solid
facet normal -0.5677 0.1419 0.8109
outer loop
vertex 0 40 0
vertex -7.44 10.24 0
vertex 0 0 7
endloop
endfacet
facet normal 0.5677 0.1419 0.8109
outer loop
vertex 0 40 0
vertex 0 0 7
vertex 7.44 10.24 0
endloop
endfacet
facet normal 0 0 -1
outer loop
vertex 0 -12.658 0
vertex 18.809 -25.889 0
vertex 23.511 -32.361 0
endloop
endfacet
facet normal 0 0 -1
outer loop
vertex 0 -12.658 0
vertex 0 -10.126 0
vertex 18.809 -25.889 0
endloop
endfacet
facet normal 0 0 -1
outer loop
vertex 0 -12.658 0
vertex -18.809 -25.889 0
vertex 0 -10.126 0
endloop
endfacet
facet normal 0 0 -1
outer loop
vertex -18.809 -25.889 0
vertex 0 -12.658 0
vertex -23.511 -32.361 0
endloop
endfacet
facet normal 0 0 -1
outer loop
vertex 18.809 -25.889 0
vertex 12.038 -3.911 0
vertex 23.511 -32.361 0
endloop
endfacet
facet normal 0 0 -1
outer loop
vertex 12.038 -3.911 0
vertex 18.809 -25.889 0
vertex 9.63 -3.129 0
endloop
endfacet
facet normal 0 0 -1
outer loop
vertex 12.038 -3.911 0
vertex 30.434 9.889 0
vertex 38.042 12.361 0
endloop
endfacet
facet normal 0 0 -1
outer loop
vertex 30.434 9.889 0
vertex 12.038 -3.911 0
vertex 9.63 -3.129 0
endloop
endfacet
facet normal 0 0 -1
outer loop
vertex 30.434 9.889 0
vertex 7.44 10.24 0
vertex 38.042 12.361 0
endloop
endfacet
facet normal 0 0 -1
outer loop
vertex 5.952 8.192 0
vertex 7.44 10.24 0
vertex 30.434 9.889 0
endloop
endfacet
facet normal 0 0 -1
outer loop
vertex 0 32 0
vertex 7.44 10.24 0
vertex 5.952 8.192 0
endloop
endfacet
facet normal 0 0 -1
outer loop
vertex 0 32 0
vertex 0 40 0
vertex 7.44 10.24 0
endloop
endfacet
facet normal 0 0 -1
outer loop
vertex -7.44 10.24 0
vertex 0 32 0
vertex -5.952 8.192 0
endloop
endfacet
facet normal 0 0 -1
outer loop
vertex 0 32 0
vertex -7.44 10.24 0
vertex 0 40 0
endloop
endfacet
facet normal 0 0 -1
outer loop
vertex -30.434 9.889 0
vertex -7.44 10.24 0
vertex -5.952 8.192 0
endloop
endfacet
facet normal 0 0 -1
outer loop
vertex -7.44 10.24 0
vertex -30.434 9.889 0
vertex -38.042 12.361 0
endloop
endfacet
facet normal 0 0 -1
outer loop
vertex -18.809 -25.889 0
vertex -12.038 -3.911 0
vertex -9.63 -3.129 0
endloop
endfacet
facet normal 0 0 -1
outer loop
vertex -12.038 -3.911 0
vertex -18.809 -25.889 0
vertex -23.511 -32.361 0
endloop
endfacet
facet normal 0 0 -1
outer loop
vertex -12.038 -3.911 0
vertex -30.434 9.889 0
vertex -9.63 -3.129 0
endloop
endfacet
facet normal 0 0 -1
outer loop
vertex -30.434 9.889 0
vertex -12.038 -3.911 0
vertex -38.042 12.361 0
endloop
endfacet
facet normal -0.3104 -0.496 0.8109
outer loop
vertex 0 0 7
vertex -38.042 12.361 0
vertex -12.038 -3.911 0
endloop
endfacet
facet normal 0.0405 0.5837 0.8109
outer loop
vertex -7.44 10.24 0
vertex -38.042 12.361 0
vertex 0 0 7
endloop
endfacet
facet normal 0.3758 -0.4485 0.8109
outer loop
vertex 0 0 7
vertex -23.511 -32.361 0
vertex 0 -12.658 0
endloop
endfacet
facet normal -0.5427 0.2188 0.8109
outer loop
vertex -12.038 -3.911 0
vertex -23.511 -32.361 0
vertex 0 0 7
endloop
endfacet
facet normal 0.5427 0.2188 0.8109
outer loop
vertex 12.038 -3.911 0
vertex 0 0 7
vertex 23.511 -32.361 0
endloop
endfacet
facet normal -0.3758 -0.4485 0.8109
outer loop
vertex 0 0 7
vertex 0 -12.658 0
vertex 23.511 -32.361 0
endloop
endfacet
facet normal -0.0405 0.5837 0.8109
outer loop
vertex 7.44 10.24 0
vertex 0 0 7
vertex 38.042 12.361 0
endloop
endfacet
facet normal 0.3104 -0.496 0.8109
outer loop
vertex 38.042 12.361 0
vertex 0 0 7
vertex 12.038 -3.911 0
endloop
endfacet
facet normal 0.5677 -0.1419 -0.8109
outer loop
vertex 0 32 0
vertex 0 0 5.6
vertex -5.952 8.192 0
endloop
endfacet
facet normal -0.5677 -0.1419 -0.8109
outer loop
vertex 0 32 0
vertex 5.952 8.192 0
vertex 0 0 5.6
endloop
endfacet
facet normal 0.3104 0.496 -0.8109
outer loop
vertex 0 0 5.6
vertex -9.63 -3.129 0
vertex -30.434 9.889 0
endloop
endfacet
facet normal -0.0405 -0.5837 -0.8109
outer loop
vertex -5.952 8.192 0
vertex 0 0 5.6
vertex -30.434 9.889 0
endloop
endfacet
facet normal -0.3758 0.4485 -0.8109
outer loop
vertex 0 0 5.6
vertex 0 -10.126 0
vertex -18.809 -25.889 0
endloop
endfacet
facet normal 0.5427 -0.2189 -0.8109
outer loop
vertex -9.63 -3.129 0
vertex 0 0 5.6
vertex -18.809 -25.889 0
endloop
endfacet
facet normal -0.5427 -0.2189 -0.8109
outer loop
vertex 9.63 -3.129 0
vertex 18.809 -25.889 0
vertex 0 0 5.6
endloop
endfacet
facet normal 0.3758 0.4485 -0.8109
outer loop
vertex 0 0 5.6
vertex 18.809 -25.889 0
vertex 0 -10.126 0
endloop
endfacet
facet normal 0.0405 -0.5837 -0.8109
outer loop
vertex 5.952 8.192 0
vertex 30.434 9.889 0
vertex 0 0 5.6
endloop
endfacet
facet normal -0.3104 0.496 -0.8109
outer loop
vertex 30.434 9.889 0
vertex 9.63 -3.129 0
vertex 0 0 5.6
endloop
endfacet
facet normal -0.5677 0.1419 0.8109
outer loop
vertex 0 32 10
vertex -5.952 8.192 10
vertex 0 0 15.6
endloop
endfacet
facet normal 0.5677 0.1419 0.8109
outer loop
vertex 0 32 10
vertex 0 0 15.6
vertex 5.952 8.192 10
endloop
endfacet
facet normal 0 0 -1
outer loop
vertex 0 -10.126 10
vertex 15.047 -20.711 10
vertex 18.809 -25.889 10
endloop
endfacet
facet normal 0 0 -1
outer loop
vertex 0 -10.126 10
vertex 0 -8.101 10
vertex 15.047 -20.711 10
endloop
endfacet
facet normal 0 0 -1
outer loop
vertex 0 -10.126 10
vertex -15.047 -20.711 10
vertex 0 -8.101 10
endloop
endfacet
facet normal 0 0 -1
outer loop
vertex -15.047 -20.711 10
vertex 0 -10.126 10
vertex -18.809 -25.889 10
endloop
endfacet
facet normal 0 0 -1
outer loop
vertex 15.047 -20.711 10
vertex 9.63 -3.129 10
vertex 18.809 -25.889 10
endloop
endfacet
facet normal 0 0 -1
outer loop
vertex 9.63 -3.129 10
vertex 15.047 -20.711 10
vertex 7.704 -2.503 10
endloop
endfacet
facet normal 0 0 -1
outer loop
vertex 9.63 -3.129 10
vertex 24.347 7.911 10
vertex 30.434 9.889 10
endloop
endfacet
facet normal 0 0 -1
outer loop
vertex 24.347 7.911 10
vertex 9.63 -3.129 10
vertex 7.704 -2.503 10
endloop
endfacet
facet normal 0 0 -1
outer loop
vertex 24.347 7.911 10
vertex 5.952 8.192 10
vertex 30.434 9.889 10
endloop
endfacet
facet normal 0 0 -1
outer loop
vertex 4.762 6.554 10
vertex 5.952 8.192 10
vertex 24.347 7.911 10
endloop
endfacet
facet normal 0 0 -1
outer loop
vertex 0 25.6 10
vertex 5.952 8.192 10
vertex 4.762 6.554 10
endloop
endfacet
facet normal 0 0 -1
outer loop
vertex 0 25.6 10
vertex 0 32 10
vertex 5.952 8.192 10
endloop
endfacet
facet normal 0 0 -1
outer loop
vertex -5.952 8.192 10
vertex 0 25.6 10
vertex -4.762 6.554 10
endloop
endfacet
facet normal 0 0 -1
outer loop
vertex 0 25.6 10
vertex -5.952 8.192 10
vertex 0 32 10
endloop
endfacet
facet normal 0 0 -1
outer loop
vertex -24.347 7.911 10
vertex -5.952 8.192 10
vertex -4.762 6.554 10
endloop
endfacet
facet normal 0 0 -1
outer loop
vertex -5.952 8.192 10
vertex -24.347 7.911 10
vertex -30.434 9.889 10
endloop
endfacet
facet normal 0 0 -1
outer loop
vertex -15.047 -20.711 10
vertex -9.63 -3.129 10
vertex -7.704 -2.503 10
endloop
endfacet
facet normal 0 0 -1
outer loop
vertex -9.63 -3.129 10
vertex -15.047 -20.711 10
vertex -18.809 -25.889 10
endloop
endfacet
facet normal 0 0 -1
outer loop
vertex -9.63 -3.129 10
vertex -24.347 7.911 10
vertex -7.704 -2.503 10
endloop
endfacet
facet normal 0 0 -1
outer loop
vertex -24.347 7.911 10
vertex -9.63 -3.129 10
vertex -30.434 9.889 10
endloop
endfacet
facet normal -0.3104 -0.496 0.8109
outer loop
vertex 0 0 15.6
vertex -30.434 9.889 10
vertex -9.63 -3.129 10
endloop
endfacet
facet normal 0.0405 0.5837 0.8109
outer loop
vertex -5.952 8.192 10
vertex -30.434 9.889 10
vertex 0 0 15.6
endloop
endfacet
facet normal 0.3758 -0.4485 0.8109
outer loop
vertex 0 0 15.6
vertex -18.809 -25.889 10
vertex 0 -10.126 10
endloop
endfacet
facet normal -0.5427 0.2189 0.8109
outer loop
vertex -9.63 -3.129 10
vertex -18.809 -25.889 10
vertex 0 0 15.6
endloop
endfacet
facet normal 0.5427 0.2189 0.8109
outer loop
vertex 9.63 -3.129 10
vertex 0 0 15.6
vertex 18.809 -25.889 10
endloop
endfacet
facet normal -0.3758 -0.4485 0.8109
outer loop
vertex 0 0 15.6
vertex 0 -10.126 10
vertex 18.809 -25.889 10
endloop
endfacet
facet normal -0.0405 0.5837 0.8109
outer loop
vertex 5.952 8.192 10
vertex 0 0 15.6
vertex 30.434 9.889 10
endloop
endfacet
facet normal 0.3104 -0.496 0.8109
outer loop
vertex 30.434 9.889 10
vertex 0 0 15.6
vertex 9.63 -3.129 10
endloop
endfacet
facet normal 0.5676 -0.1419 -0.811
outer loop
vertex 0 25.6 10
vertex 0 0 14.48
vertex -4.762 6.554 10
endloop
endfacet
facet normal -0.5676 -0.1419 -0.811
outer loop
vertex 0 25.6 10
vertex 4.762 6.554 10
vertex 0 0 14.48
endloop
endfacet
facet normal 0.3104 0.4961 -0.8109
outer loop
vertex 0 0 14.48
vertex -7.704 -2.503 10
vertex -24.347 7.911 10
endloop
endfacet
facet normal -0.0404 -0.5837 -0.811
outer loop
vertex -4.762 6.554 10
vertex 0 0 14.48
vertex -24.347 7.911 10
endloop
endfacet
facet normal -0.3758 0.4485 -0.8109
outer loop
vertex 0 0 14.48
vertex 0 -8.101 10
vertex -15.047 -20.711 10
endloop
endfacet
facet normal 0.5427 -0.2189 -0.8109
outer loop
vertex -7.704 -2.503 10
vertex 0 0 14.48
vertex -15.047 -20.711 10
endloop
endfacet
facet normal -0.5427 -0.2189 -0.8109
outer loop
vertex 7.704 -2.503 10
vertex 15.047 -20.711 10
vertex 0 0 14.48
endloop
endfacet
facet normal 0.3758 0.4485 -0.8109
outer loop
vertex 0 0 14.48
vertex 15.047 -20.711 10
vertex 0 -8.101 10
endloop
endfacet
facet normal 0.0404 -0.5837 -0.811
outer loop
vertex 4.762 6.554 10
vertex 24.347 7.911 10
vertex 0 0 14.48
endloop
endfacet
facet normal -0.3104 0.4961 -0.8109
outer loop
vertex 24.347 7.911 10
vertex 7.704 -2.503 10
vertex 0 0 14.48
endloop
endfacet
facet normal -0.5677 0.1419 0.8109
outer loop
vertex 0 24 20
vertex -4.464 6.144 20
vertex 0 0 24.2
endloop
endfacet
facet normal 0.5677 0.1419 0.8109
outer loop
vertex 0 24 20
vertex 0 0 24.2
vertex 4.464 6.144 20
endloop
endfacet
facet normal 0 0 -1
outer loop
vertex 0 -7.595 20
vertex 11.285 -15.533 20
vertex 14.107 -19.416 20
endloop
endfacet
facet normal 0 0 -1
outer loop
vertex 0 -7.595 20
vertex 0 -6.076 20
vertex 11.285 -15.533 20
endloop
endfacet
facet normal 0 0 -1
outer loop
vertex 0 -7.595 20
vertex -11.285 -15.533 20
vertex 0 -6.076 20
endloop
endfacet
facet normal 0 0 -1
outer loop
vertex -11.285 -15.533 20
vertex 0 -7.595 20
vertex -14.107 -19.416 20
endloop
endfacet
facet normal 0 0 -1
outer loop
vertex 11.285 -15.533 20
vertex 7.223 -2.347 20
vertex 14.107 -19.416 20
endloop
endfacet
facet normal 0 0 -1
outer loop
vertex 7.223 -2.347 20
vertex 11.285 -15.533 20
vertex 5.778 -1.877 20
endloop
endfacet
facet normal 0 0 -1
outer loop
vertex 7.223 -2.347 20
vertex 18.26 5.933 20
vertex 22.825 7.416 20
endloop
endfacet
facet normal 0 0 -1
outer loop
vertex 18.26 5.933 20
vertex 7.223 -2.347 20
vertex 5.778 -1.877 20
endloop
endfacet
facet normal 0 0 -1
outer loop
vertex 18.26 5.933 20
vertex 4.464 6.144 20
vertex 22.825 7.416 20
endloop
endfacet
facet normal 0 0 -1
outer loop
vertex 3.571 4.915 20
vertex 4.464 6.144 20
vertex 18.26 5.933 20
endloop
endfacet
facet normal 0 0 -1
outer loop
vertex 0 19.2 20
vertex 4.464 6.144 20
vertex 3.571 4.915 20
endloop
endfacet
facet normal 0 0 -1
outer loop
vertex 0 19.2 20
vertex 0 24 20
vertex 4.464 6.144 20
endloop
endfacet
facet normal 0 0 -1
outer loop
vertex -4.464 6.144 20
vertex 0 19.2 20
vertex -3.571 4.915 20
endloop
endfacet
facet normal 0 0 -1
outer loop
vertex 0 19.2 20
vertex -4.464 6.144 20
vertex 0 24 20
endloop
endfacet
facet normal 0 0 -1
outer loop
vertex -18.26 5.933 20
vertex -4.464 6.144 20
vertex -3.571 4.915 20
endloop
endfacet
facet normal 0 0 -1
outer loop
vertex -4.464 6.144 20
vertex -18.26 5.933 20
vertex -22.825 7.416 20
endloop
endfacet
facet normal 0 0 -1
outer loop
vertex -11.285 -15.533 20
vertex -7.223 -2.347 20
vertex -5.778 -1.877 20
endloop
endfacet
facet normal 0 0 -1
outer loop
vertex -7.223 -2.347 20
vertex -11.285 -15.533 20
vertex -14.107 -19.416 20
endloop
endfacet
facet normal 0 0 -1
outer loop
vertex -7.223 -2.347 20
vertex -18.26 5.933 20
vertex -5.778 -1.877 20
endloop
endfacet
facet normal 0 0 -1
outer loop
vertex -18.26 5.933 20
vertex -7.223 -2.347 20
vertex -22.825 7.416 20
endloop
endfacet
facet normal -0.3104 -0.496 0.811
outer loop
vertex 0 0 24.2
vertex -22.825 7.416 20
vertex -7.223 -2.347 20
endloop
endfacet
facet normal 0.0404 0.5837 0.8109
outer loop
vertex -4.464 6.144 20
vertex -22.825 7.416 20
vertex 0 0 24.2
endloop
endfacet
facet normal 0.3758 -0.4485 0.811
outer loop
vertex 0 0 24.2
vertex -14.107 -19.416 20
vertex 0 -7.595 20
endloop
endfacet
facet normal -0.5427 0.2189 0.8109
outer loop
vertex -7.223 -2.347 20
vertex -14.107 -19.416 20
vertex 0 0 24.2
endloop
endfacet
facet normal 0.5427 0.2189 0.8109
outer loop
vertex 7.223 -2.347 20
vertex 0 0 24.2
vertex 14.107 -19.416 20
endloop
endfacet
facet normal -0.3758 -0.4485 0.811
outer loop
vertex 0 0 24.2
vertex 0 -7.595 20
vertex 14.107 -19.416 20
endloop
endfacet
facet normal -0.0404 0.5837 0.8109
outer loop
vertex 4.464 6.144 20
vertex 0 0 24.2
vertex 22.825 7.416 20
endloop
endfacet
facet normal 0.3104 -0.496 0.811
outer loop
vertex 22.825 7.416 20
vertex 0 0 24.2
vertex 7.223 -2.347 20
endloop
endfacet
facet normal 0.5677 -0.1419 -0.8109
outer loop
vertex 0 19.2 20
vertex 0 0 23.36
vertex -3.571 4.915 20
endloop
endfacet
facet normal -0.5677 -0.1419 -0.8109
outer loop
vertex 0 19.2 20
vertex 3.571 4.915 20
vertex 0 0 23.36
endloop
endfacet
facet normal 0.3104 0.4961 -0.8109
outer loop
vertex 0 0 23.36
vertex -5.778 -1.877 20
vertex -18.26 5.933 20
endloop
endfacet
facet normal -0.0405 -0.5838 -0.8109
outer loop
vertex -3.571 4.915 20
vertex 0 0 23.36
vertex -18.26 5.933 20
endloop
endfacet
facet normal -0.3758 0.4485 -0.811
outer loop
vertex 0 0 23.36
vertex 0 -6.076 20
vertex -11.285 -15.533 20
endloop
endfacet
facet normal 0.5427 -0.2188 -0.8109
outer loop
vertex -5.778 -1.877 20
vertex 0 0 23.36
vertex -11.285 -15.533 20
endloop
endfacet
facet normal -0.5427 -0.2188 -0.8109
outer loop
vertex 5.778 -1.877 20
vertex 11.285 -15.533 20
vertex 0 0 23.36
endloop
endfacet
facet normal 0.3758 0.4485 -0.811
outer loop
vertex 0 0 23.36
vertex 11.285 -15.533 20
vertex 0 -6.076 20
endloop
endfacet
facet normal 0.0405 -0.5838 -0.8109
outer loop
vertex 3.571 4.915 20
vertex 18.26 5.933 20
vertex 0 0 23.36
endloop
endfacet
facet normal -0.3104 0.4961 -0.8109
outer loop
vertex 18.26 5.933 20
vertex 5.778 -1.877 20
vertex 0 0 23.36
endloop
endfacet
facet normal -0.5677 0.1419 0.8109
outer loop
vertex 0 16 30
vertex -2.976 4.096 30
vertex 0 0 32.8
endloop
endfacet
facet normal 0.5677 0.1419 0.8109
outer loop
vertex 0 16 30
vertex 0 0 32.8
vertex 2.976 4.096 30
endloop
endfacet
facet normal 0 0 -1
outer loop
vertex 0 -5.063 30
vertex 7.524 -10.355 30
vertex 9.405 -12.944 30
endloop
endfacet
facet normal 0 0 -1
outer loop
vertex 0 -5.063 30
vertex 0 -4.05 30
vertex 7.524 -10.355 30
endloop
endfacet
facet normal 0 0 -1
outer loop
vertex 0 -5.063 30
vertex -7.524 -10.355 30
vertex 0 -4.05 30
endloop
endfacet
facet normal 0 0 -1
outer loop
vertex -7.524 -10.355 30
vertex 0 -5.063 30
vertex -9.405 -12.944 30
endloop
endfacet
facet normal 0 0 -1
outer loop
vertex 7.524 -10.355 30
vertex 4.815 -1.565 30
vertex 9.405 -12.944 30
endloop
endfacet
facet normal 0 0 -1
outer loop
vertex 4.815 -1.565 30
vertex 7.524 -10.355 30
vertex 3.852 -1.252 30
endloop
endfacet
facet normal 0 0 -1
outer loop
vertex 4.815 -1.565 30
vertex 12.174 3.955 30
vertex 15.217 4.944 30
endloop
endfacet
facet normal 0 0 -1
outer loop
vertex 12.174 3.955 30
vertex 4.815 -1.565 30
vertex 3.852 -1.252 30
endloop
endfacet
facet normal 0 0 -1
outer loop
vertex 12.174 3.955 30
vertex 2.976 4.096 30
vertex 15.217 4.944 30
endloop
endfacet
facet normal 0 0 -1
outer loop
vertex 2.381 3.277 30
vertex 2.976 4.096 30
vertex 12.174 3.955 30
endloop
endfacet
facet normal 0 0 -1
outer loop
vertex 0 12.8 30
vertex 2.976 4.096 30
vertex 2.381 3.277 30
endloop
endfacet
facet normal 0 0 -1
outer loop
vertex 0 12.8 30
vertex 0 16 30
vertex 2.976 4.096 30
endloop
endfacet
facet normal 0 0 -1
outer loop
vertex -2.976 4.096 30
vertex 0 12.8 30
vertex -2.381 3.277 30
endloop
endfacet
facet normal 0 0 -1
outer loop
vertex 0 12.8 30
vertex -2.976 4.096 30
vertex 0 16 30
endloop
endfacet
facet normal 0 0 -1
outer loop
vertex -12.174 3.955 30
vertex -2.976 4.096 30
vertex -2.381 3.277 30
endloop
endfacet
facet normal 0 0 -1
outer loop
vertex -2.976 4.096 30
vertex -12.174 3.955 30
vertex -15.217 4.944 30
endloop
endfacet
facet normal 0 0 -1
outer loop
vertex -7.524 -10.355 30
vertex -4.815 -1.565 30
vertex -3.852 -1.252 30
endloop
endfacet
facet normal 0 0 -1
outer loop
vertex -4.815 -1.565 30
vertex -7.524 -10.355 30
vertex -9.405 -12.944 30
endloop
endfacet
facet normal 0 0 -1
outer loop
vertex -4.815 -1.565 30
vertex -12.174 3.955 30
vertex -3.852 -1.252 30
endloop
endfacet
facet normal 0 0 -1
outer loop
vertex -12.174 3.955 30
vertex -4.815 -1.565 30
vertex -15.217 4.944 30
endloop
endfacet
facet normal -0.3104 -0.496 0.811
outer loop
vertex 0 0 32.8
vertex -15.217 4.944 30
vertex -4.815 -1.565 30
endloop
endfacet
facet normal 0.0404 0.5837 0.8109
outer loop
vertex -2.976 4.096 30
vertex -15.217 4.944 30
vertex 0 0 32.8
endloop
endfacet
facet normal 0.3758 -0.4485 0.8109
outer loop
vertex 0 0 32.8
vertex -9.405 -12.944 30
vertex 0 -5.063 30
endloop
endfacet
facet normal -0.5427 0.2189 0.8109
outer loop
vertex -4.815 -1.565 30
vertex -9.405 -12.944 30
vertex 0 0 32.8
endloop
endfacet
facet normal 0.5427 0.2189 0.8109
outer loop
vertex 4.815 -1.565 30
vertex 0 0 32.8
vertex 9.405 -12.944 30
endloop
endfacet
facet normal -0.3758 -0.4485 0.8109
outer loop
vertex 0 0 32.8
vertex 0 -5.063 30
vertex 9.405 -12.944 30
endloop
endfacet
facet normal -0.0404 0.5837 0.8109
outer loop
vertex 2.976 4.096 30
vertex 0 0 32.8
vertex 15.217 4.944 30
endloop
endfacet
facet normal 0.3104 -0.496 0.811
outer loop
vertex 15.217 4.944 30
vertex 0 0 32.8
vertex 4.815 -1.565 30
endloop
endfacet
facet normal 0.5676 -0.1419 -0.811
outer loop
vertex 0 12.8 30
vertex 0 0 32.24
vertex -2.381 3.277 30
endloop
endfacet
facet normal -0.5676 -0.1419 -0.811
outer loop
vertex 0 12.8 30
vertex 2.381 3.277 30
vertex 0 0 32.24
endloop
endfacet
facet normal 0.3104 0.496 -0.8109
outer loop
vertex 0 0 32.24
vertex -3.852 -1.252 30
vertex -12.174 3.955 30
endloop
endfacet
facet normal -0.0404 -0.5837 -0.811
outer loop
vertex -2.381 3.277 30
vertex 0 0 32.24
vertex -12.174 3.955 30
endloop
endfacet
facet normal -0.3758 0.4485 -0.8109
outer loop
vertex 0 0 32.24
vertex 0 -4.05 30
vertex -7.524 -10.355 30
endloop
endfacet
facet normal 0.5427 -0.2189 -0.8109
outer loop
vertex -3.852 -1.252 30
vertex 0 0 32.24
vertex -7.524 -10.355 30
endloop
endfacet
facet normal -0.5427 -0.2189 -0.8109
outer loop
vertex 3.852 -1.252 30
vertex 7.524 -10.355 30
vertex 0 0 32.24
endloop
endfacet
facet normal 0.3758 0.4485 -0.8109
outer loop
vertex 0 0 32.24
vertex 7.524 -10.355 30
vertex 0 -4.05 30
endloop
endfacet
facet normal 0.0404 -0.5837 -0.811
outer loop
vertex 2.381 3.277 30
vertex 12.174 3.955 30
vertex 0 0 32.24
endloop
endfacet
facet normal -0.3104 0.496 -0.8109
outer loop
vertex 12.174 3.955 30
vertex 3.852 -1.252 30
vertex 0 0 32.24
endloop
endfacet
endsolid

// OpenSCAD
$fn = 100;


module wing() {
  rotate([90, 0, 180])
    difference() {
      scale([1, 0.7, 1])
        cylinder(h=40, d1=20, d2=0, $fn=4);
      translate([-10, -7, 0])
        cube([20, 7, 40]);
    }
}


module star_body() {
  for(angle = [0: 72: 360])
    rotate([0, 0, angle]) wing();
}


module star(scaled=1) {
  scale([scaled, scaled, scaled])
    difference() {
      star_body();
      scale([0.8, 0.8, 0.8])
        star_body();
    }
}



star();
translate([0, 0, 10]) star(scaled=0.8);
translate([0, 0, 20]) star(scaled=0.6);
translate([0, 0, 30]) star(scaled=0.4);
